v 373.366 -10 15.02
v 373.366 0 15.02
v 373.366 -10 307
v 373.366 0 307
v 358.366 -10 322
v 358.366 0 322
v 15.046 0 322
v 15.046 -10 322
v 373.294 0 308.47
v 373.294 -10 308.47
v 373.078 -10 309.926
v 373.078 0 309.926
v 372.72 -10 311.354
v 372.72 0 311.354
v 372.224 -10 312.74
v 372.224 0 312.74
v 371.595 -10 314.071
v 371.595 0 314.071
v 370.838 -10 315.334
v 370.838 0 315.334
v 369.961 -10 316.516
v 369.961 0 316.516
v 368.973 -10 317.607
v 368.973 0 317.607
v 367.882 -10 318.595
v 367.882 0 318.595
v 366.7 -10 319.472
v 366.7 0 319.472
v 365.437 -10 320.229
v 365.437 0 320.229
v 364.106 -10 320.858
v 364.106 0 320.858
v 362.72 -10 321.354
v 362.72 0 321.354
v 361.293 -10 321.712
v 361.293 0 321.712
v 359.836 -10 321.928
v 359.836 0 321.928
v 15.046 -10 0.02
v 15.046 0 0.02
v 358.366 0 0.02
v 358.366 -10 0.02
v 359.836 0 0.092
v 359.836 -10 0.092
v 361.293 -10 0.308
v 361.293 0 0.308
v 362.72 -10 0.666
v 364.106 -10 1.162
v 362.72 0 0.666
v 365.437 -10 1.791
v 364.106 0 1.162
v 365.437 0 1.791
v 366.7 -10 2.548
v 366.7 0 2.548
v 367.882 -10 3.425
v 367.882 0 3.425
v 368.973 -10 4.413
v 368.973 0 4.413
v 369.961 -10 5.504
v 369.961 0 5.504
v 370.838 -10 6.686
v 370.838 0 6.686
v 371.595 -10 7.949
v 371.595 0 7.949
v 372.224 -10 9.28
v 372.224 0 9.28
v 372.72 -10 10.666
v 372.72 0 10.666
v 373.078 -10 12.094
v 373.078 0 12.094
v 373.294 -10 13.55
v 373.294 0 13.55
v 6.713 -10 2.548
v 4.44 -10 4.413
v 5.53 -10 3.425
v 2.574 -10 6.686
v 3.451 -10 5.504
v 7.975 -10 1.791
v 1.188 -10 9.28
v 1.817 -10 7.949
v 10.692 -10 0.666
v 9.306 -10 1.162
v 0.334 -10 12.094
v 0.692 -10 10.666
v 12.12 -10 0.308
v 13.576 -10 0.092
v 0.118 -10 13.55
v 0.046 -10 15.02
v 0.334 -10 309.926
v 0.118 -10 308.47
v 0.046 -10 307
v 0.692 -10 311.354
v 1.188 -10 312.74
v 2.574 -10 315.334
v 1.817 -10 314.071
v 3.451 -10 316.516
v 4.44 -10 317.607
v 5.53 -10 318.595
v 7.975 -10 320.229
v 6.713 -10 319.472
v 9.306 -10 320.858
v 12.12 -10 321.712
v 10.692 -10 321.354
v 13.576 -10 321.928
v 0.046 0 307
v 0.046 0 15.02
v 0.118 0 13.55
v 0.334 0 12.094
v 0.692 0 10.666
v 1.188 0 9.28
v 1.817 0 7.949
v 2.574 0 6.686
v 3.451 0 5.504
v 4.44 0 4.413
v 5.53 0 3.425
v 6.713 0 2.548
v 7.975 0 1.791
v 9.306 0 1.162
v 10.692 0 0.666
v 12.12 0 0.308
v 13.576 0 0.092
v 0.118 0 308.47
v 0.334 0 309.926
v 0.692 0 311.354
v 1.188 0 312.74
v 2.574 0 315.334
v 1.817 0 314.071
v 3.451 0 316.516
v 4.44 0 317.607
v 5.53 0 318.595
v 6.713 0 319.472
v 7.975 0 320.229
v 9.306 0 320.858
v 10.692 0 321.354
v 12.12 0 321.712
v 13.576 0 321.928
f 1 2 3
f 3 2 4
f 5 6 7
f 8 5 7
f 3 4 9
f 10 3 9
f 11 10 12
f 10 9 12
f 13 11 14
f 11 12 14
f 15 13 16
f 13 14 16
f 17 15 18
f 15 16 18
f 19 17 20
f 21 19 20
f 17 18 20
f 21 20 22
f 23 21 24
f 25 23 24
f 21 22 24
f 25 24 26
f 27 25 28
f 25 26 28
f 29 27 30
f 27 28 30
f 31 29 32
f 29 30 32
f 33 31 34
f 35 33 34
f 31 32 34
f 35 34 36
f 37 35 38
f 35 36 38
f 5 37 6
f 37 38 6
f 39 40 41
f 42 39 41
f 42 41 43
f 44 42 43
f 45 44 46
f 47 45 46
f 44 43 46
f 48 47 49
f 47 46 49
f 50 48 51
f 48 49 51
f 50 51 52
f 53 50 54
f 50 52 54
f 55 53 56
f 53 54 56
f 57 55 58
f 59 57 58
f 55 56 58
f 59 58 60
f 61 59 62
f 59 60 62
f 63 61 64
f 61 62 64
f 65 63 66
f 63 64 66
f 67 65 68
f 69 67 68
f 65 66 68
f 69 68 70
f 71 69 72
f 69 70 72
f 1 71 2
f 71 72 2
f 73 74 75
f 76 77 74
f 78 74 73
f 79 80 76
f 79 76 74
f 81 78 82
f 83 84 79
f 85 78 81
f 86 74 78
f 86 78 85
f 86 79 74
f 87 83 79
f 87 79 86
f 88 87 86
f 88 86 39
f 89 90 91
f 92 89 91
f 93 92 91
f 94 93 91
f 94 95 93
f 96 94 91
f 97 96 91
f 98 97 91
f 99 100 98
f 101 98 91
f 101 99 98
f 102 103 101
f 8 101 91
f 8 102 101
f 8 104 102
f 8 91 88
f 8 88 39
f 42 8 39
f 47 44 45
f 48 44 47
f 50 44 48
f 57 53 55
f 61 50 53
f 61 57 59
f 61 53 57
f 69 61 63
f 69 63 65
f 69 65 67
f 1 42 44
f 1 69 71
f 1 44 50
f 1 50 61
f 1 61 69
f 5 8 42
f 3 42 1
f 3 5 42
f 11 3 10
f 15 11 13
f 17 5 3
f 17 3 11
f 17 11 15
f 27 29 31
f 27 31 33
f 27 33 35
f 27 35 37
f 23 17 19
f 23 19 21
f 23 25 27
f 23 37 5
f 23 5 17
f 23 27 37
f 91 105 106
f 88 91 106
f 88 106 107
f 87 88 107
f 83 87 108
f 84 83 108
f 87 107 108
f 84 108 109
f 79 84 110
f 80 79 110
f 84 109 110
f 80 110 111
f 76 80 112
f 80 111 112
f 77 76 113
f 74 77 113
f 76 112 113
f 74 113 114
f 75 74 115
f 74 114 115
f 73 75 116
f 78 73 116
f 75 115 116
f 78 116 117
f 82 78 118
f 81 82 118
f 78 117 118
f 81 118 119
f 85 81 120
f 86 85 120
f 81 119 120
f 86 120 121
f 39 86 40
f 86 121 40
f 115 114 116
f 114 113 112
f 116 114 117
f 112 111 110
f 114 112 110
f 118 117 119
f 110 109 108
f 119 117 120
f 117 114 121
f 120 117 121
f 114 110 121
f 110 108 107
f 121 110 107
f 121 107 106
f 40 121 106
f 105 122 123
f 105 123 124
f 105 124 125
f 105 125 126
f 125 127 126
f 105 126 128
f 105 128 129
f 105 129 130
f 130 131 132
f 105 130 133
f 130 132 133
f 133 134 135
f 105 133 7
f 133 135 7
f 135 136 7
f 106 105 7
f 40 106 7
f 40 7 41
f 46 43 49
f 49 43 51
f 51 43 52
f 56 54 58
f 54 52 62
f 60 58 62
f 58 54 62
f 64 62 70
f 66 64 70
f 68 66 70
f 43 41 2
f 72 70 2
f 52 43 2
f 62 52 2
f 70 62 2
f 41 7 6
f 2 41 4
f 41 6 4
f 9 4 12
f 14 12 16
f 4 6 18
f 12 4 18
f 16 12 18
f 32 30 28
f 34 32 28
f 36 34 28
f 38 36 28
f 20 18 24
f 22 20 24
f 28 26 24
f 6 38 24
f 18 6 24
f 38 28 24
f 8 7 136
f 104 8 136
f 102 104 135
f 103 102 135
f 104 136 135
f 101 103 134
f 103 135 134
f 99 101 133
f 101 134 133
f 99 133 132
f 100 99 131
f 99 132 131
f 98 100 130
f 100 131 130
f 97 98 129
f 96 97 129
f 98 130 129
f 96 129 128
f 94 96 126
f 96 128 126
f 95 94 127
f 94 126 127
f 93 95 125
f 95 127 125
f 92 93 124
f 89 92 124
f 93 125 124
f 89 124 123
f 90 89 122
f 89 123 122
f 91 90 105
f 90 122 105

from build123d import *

# Parameters (mm, degrees)
PAD_DEPTH = 10


with BuildPart() as part:
    # Sketch → Pad (new body)
    with BuildSketch(Plane.XZ):
        with BuildLine():
            Line((15.046216, 0.019959), (358.366216, 0.019959))
            ThreePointArc((358.366216, 0.019959), (368.972817, 4.413357), (373.366216, 15.019959))
            Line((373.366216, 15.019959), (373.366216, 306.999959))
            ThreePointArc((373.366216, 306.999959), (368.972817, 317.60656), (358.366216, 321.999959))
            Line((358.366216, 321.999959), (15.046216, 321.999959))
            ThreePointArc((15.046216, 321.999959), (4.439614, 317.60656), (0.046216, 306.999959))
            Line((0.046216, 306.999959), (0.046216, 15.019959))
            ThreePointArc((0.046216, 15.019959), (4.439614, 4.413357), (15.046216, 0.019959))
        make_face()
    extrude(amount=PAD_DEPTH)


solid = part.part
